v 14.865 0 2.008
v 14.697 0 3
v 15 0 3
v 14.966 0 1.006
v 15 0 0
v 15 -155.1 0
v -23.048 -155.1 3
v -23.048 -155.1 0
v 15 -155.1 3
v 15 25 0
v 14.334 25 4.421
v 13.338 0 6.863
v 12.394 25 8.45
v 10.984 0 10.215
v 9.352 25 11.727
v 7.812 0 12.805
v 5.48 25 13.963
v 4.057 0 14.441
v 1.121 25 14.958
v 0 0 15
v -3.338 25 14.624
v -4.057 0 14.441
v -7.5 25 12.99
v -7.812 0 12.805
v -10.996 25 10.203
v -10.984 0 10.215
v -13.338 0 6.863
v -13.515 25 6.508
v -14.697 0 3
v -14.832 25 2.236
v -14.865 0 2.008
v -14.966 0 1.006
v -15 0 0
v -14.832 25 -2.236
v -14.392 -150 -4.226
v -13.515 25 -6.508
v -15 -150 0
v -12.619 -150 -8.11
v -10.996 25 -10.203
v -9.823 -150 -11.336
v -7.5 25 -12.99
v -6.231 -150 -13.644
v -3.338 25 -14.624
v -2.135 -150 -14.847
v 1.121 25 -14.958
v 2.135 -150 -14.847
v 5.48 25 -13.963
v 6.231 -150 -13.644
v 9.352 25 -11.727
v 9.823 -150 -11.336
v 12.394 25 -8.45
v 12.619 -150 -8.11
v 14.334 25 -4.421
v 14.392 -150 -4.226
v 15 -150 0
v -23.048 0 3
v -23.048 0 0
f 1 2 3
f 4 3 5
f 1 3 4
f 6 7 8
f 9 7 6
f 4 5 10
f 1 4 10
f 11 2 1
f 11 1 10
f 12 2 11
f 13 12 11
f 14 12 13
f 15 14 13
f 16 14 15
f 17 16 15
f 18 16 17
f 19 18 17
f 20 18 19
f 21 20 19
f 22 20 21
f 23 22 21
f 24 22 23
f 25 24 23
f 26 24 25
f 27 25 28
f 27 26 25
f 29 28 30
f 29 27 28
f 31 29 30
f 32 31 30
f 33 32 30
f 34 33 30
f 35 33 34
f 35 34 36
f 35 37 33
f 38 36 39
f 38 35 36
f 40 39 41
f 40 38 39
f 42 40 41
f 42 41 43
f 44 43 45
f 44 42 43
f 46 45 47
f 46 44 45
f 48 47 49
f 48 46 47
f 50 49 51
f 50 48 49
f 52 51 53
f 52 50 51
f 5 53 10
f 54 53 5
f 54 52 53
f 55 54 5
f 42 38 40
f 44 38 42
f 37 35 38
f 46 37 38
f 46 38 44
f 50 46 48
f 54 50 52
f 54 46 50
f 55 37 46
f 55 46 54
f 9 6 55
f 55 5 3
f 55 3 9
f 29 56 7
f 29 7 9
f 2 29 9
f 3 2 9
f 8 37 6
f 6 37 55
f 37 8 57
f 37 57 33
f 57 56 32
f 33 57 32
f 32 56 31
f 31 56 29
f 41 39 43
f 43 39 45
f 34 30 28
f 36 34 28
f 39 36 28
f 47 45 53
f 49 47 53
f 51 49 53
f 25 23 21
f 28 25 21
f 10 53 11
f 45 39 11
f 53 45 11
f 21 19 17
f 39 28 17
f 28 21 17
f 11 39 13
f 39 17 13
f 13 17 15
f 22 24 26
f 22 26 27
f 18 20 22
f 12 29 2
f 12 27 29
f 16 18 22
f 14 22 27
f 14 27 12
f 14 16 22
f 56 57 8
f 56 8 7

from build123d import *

# Parameters (mm, degrees)
F1_DEPTH = 150
F3_R     = 15
F4_DEPTH = 25
F5_W     = 38.047614
F5_H     = 3
F6_DEPTH = 155.1


with BuildPart() as f1:
    # F0 (on Front) → F1 (new body)
    with BuildSketch(Plane.XZ):
        with BuildLine():
            Line((15, 0), (-15, 0))
            ThreePointArc((-15, 0), (0, -15), (15, 0))
        make_face()
    extrude(amount=F1_DEPTH)

    # F3 (on Front) → F4 (join)
    with BuildSketch(Plane.XZ):
        Circle(F3_R)
    extrude(amount=-F4_DEPTH)

    # F5 (on face) → F6 (join)
    with BuildSketch(Plane.XZ):
        with Locations((-4.023807, 1.5)):
            Rectangle(F5_W, F5_H)
    extrude(amount=F6_DEPTH)


solid = f1.part
